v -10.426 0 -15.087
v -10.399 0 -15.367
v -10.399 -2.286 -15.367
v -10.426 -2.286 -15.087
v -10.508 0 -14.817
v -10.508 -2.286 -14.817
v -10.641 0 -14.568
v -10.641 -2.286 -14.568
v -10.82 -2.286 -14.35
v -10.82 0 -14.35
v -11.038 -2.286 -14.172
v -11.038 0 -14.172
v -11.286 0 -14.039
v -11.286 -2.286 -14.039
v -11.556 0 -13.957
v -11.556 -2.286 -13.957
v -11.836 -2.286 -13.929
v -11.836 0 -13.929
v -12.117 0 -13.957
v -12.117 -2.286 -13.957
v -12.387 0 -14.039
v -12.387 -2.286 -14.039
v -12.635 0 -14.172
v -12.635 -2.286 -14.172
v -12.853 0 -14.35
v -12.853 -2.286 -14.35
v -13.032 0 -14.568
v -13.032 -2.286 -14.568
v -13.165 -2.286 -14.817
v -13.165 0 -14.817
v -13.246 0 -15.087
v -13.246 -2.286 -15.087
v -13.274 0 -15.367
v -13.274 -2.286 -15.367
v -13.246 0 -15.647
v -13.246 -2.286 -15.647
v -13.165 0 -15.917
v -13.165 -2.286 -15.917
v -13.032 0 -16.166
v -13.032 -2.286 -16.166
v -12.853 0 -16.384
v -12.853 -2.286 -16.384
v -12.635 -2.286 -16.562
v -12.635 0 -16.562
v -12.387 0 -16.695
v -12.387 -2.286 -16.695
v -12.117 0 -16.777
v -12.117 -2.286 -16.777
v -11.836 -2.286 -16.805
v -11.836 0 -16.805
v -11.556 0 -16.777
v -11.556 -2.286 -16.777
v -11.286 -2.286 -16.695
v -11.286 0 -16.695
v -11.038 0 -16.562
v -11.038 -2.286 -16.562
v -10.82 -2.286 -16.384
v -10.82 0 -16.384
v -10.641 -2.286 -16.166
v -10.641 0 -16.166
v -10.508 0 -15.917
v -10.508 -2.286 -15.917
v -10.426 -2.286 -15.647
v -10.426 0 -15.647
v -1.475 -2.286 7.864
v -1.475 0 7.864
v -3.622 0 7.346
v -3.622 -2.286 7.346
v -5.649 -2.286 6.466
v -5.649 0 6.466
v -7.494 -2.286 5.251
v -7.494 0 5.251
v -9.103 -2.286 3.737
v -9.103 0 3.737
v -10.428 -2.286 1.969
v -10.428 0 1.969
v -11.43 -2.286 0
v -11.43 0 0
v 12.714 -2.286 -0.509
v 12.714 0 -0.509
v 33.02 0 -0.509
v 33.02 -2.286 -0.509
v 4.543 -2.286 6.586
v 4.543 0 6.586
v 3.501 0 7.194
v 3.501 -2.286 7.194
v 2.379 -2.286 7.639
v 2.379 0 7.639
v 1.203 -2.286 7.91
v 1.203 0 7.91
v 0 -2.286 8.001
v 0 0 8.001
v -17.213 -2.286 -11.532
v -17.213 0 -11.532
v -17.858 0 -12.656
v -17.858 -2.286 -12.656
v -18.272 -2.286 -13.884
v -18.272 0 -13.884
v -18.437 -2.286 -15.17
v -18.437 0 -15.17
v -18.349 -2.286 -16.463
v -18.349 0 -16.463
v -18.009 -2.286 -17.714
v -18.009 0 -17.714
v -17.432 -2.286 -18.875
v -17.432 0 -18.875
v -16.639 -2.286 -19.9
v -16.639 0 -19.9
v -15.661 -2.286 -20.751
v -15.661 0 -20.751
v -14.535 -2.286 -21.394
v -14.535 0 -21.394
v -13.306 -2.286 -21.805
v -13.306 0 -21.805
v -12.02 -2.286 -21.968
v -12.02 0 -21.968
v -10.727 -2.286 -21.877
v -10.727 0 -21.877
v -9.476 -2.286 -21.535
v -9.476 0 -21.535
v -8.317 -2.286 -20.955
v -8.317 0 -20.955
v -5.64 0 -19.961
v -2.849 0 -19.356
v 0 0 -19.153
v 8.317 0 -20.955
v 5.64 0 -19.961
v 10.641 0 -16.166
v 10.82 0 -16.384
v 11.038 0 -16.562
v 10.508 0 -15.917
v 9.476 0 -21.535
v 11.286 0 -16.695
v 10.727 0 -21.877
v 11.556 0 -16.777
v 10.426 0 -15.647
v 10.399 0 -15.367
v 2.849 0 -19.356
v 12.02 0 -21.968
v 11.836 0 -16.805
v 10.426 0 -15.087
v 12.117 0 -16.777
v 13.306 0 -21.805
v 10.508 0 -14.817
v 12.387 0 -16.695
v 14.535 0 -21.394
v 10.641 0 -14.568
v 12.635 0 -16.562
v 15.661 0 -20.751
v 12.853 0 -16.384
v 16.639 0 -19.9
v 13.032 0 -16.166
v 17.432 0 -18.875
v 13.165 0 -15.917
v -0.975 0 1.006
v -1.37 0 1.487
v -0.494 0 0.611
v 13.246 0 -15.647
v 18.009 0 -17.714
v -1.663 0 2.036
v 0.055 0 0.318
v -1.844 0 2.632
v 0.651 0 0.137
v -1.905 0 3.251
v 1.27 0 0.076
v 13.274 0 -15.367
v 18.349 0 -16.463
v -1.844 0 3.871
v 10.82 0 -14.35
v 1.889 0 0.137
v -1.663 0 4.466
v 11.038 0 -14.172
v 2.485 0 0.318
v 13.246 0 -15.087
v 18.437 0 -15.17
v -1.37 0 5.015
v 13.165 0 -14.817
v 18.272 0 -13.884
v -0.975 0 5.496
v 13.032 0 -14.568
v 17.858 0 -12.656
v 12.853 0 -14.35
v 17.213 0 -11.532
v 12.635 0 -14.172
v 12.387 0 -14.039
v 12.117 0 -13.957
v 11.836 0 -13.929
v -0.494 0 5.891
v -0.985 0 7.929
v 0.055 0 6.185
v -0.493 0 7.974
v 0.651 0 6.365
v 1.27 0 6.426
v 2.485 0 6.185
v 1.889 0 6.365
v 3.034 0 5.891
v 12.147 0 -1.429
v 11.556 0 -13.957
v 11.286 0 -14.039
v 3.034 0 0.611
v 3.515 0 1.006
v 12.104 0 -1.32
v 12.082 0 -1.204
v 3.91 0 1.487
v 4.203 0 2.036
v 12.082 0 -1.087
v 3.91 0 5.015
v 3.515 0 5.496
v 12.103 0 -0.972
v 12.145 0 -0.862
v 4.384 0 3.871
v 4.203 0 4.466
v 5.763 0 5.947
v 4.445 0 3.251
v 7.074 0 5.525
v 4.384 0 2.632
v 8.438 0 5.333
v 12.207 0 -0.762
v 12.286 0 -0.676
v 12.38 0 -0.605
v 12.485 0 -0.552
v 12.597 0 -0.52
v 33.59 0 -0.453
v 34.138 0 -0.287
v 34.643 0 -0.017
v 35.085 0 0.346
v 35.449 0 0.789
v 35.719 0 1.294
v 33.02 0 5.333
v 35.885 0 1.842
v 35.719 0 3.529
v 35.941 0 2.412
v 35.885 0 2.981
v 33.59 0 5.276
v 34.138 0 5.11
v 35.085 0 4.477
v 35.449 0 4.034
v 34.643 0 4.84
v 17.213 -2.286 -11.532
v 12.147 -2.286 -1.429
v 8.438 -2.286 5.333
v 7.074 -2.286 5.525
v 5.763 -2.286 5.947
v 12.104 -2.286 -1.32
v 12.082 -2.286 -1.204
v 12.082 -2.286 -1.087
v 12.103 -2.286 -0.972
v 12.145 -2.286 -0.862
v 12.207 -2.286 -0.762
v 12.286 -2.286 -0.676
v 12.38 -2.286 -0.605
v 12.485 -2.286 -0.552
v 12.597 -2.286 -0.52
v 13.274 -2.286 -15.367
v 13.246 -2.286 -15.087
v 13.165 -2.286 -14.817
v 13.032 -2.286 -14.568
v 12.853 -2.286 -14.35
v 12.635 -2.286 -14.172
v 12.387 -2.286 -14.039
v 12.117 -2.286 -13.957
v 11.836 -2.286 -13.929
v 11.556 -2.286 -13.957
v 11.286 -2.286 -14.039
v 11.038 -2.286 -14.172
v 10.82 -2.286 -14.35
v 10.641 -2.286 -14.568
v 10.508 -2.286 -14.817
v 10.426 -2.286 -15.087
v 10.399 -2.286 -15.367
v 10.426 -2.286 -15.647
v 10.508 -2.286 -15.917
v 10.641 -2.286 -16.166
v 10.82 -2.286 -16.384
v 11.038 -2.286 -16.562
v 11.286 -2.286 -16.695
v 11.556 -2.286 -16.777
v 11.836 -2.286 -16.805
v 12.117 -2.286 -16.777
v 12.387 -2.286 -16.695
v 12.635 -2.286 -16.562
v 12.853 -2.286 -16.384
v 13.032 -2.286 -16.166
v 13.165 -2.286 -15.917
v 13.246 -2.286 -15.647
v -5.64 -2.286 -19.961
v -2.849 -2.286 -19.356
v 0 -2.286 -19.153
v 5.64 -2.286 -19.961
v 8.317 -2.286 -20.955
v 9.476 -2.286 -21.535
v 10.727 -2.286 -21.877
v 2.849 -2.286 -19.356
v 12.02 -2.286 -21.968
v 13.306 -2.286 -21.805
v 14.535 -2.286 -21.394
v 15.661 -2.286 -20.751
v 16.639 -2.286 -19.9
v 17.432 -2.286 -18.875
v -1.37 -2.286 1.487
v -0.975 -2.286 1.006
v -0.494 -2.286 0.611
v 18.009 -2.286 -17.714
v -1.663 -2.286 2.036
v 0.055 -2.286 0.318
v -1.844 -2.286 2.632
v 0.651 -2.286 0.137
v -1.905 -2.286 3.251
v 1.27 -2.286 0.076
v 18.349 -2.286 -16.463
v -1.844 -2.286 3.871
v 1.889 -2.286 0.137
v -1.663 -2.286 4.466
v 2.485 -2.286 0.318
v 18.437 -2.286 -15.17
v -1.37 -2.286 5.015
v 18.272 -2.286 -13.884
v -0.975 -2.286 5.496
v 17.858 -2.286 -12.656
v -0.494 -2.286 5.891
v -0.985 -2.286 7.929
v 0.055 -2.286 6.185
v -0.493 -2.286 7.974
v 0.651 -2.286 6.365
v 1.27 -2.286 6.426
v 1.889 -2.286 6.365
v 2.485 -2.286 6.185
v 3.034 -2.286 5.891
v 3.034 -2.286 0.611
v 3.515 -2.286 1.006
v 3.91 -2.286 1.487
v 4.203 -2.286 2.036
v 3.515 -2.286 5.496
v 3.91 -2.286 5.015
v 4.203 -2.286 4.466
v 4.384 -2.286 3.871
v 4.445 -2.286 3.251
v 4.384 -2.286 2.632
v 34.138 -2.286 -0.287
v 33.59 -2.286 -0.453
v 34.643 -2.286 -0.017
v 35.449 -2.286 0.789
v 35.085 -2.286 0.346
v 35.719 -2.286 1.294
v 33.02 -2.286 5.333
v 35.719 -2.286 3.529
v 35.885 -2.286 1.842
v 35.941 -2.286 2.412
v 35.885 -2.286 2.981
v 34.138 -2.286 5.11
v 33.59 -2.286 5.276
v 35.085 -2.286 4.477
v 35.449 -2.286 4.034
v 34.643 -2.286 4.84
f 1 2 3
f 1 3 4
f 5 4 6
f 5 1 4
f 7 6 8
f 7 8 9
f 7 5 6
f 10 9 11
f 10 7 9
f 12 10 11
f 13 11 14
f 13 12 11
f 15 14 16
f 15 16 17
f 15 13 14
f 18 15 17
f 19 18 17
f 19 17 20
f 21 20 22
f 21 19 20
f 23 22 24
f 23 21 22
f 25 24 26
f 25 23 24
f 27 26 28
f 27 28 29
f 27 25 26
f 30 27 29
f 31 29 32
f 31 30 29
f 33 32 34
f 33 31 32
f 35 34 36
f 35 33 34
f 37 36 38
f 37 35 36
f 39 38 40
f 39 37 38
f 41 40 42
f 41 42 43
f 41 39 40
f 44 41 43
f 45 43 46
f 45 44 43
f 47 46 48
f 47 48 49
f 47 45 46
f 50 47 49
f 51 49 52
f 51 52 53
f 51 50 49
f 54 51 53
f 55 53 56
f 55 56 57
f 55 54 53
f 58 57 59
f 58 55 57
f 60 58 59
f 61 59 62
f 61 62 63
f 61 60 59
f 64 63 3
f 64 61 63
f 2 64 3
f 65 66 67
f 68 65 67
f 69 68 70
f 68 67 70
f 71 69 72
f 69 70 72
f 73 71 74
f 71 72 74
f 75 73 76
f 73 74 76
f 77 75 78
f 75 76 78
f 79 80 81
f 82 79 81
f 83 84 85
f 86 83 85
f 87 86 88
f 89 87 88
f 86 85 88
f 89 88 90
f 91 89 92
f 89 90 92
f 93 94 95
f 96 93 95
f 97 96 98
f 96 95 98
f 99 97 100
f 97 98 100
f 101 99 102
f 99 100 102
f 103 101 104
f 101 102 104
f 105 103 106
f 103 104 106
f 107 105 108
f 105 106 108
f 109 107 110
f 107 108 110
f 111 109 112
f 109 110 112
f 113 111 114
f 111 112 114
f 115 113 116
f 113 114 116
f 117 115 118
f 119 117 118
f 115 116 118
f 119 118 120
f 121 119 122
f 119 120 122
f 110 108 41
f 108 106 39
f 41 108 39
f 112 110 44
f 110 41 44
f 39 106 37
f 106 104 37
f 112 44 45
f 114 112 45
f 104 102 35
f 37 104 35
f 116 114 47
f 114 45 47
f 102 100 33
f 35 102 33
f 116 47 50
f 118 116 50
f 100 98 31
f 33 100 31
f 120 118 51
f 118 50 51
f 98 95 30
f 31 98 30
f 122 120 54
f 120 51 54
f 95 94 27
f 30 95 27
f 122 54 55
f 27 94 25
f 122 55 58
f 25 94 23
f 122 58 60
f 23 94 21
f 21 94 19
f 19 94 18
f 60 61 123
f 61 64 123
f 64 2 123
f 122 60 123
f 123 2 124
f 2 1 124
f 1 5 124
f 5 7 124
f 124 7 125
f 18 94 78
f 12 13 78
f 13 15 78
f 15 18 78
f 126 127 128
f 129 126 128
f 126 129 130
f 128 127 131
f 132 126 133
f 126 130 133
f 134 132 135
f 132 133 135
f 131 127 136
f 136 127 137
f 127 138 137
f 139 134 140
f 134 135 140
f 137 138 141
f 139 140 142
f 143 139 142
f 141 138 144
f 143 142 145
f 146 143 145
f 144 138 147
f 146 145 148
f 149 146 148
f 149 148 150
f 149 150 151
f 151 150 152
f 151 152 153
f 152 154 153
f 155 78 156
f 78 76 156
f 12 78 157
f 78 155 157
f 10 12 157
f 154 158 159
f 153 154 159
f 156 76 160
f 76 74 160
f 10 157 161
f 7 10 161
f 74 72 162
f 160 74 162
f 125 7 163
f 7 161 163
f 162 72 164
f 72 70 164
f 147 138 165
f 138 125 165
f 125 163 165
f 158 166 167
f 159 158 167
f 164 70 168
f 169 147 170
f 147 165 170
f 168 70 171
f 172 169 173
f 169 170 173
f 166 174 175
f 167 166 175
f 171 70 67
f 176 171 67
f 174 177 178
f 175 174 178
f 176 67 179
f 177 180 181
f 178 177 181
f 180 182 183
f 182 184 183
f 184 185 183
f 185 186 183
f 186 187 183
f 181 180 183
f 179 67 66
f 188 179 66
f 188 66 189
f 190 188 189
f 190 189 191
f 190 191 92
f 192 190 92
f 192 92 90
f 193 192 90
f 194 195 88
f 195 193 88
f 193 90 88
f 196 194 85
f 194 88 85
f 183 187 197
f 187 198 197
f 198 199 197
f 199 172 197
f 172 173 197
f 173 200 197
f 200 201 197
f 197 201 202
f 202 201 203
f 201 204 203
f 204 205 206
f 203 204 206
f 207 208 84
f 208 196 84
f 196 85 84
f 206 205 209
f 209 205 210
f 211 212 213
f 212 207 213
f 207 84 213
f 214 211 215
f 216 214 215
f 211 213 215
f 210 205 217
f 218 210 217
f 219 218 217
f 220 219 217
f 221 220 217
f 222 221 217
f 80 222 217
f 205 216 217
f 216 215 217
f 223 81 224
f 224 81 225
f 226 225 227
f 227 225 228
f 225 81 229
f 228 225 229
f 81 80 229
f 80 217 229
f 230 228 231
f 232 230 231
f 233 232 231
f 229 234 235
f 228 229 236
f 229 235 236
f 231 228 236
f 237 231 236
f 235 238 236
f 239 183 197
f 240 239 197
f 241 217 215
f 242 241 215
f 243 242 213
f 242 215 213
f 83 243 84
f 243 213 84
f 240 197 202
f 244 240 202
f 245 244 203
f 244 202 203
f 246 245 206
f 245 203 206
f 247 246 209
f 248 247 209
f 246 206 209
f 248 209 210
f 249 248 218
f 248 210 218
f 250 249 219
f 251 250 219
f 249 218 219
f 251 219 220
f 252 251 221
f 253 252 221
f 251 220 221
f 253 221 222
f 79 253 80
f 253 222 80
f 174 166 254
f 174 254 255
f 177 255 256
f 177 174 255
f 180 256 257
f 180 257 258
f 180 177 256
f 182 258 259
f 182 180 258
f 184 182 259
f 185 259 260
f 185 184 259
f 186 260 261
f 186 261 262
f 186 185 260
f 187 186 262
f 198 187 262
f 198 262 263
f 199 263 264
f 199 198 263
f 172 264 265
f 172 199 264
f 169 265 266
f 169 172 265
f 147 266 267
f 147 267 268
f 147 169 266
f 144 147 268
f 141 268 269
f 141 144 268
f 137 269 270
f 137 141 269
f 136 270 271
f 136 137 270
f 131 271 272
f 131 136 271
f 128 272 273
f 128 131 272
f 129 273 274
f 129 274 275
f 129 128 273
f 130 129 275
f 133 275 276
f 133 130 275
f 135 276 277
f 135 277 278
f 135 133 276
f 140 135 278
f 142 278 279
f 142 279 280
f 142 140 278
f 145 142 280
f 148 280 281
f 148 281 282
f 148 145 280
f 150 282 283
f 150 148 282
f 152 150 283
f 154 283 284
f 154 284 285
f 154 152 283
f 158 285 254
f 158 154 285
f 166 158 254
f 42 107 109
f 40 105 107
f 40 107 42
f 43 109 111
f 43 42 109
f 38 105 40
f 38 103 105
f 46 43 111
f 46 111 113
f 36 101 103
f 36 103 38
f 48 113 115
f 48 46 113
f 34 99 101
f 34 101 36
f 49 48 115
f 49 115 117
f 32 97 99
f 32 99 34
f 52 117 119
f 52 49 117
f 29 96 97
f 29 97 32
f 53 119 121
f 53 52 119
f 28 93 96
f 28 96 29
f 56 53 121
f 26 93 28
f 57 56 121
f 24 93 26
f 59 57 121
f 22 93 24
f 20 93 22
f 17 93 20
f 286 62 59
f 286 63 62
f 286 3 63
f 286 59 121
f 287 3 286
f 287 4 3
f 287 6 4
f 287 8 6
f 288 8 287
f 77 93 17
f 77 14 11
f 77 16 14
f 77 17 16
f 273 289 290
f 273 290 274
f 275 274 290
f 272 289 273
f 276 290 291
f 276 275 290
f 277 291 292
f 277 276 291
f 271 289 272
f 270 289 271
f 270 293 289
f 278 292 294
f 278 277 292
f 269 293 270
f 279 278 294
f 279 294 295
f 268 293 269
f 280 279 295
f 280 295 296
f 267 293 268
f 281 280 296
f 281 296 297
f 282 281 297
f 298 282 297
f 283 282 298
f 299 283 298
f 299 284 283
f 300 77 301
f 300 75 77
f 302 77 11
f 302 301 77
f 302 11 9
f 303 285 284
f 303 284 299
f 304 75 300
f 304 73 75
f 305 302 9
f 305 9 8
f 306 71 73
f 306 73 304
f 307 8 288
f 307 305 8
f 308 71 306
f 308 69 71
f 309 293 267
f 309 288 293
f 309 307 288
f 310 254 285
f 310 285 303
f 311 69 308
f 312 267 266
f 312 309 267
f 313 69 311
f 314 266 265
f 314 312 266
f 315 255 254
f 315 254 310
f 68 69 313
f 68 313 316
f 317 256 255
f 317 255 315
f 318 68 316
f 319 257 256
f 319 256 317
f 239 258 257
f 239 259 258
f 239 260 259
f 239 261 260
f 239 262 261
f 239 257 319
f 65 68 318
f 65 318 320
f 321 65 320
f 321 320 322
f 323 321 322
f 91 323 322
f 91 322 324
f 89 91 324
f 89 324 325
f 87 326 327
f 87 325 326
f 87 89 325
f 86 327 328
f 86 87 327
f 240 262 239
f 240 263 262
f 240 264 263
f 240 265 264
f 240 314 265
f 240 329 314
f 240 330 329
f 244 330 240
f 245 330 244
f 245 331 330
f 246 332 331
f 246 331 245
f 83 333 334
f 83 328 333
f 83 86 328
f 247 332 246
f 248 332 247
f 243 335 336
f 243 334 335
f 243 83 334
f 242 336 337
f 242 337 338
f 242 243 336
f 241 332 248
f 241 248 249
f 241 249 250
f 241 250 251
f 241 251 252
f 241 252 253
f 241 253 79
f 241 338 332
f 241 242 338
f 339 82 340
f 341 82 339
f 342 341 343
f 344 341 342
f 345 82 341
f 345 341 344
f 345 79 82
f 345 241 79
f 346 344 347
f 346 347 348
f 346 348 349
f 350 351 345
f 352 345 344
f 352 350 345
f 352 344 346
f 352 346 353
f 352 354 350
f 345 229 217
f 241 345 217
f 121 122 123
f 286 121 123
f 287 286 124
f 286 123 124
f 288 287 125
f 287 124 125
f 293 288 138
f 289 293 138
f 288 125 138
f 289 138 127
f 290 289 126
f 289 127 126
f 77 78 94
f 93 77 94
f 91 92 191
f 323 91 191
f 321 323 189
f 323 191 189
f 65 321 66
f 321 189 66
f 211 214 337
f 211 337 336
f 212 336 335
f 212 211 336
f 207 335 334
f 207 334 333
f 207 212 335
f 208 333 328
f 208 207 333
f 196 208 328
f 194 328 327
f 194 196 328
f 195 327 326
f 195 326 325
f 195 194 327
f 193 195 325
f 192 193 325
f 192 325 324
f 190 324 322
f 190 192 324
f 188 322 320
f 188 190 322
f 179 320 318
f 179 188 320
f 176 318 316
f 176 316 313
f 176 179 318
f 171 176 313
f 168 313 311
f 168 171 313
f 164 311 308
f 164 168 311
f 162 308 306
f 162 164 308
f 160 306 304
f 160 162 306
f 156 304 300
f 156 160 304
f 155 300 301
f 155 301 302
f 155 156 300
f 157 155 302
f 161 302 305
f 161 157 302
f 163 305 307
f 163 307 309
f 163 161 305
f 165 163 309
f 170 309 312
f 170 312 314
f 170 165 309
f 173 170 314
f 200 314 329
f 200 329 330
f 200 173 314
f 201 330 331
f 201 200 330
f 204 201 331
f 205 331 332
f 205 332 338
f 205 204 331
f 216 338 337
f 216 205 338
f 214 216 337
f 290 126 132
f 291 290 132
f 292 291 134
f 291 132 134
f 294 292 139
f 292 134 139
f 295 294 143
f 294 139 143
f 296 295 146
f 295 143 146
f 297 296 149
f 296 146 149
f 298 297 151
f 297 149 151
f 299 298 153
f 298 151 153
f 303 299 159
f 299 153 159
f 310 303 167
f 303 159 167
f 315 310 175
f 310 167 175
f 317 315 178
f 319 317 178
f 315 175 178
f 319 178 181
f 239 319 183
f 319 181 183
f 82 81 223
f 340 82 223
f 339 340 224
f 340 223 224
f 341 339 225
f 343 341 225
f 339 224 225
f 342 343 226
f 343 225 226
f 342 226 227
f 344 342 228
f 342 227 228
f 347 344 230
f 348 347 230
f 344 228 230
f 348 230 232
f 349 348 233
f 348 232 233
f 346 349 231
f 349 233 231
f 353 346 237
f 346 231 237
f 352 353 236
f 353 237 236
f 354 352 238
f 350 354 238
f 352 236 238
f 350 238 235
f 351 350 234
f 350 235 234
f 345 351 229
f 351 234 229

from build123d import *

# Parameters (mm, degrees)
F0_R     = 1.43764
F0_R_2   = 3.175
F1_DEPTH = 2.286


with BuildPart() as f1:
    # F0 (on Front) → F1 (new body)
    with BuildSketch(Plane.XZ):
        with BuildLine():
            Line((-11.43, 0), (-17.212507, -11.5316))
            ThreePointArc((-17.212507, -11.5316), (-16.638674, -19.900319), (-8.316873, -20.955))
            ThreePointArc((-8.316873, -20.955), (0, -19.152777), (8.316873, -20.955))
            ThreePointArc((8.316873, -20.955), (16.638674, -19.900319), (17.212507, -11.5316))
            Line((17.212507, -11.5316), (12.146577, -1.429014))
            ThreePointArc((12.146577, -1.429014), (12.173853, -0.810849), (12.714209, -0.509375))
            Line((12.714209, -0.509375), (33.02, -0.509375))
            ThreePointArc((33.02, -0.509375), (35.941, 2.411625), (33.02, 5.332625))
            Line((33.02, 5.332625), (8.437909, 5.332625))
            ThreePointArc((8.437909, 5.332625), (6.409691, 5.70754), (4.543451, 6.585822))
            ThreePointArc((4.543451, 6.585822), (2.379373, 7.639017), (0, 8.001))
            ThreePointArc((0, 8.001), (-0.739302, 7.953795), (-1.474639, 7.863933))
            ThreePointArc((-1.474639, 7.863933), (-7.494188, 5.250922), (-11.43, 0))
        make_face()
        with Locations((-11.8364, -15.367)):
            Circle(F0_R, mode=Mode.SUBTRACT)
        with Locations((11.8364, -15.367)):
            Circle(F0_R, mode=Mode.SUBTRACT)
        with Locations((1.27, 3.2512)):
            Circle(F0_R_2, mode=Mode.SUBTRACT)
    extrude(amount=F1_DEPTH)


solid = f1.part
